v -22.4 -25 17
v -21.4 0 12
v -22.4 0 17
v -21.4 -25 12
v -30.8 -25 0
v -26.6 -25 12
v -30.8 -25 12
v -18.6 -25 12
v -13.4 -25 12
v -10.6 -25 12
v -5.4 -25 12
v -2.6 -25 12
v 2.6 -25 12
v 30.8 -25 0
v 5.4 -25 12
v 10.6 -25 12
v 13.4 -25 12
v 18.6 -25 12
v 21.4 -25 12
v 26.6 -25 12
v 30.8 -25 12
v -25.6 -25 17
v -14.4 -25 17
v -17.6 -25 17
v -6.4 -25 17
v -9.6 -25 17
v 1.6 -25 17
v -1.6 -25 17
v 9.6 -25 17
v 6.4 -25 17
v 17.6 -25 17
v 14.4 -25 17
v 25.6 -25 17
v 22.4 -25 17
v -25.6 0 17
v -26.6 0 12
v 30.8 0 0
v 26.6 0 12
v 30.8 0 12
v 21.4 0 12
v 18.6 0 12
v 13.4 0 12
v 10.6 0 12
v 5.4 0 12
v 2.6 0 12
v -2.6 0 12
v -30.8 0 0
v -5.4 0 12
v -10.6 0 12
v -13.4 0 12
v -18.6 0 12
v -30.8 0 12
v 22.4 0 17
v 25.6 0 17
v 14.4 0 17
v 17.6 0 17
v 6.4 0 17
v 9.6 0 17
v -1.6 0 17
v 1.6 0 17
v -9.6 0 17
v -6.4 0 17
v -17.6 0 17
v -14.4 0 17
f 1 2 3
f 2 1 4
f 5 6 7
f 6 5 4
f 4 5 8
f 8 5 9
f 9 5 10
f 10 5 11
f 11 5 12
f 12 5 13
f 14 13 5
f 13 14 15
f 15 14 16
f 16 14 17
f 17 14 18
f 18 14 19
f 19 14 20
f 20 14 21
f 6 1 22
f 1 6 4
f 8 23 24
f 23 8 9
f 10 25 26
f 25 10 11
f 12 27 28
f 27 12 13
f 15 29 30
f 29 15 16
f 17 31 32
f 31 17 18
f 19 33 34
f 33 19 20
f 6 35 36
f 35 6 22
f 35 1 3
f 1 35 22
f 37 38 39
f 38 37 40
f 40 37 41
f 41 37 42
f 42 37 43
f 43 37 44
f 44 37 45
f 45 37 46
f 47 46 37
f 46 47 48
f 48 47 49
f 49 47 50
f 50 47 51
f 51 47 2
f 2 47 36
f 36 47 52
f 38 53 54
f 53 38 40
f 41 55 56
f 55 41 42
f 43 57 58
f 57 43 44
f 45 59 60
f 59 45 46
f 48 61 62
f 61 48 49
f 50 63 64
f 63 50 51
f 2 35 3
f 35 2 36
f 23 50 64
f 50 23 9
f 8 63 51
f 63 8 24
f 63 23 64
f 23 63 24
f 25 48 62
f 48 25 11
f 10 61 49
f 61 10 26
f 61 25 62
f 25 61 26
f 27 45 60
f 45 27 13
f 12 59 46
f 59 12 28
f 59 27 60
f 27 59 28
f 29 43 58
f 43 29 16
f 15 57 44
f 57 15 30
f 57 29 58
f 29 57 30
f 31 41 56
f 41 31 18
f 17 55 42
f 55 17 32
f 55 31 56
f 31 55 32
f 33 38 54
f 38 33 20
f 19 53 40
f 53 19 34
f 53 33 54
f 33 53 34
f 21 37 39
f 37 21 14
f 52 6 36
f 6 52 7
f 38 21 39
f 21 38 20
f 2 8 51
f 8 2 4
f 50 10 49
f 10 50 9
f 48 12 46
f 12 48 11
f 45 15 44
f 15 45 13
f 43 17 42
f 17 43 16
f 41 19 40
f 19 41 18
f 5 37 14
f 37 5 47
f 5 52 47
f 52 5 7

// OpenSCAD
$fn = 32;

// ----------------------------------------------------------------------
// Toothed rack, 7 teeth
// 8 mm pitch, 5 mm teeth
// ----------------------------------------------------------------------

// --- parameters (mm) ---
bar_w = 25;     // bar width (Y)
bar_h = 12;     // bar height (Z)
teeth = 7;      // number of teeth
pitch = 8;      // tooth pitch
tooth_h = 5;    // tooth height above the bar
root_w = 5.6;   // tooth width at the root
crest_w = 3.2;  // tooth width at the crest

// --- derived feature positions (mm) ---
span = (teeth - 1) * pitch;  // = 48   distance between the outer teeth
bar_l = span + root_w + 8;   // = 61.6   bar length: teeth plus 4 mm at each end
tooth_x = -span / 2;         // = -24   X of the first tooth
height = bar_h + tooth_h;    // = 17   overall height
feature_centers = [
  [tooth_x + 0 * pitch, -bar_w / 2],
  [tooth_x + 1 * pitch, -bar_w / 2],
  [tooth_x + 2 * pitch, -bar_w / 2],
  [tooth_x + 3 * pitch, -bar_w / 2],
  [tooth_x + 4 * pitch, -bar_w / 2],
  [tooth_x + 5 * pitch, -bar_w / 2],
  [tooth_x + 6 * pitch, -bar_w / 2]
];   // tooth centre line, drives the tooth loop

// bar with a rack of teeth, one extruded trapezoium per centre
module rack_tooth() {
  linear_extrude(height = bar_w)
    polygon(points = [
      [0, 0],
      [root_w, 0],
      [root_w / 2 + crest_w / 2, tooth_h + 1],
      [root_w / 2 - crest_w / 2, tooth_h + 1]
    ]);
}

union() {
  translate([-bar_l / 2, -bar_w, 0]) cube([bar_l, bar_w, bar_h]);
  for (centre = feature_centers)
    translate([centre[0] - root_w / 2, 0, bar_h - 1]) rotate([90, 0, 0]) rack_tooth();
}
